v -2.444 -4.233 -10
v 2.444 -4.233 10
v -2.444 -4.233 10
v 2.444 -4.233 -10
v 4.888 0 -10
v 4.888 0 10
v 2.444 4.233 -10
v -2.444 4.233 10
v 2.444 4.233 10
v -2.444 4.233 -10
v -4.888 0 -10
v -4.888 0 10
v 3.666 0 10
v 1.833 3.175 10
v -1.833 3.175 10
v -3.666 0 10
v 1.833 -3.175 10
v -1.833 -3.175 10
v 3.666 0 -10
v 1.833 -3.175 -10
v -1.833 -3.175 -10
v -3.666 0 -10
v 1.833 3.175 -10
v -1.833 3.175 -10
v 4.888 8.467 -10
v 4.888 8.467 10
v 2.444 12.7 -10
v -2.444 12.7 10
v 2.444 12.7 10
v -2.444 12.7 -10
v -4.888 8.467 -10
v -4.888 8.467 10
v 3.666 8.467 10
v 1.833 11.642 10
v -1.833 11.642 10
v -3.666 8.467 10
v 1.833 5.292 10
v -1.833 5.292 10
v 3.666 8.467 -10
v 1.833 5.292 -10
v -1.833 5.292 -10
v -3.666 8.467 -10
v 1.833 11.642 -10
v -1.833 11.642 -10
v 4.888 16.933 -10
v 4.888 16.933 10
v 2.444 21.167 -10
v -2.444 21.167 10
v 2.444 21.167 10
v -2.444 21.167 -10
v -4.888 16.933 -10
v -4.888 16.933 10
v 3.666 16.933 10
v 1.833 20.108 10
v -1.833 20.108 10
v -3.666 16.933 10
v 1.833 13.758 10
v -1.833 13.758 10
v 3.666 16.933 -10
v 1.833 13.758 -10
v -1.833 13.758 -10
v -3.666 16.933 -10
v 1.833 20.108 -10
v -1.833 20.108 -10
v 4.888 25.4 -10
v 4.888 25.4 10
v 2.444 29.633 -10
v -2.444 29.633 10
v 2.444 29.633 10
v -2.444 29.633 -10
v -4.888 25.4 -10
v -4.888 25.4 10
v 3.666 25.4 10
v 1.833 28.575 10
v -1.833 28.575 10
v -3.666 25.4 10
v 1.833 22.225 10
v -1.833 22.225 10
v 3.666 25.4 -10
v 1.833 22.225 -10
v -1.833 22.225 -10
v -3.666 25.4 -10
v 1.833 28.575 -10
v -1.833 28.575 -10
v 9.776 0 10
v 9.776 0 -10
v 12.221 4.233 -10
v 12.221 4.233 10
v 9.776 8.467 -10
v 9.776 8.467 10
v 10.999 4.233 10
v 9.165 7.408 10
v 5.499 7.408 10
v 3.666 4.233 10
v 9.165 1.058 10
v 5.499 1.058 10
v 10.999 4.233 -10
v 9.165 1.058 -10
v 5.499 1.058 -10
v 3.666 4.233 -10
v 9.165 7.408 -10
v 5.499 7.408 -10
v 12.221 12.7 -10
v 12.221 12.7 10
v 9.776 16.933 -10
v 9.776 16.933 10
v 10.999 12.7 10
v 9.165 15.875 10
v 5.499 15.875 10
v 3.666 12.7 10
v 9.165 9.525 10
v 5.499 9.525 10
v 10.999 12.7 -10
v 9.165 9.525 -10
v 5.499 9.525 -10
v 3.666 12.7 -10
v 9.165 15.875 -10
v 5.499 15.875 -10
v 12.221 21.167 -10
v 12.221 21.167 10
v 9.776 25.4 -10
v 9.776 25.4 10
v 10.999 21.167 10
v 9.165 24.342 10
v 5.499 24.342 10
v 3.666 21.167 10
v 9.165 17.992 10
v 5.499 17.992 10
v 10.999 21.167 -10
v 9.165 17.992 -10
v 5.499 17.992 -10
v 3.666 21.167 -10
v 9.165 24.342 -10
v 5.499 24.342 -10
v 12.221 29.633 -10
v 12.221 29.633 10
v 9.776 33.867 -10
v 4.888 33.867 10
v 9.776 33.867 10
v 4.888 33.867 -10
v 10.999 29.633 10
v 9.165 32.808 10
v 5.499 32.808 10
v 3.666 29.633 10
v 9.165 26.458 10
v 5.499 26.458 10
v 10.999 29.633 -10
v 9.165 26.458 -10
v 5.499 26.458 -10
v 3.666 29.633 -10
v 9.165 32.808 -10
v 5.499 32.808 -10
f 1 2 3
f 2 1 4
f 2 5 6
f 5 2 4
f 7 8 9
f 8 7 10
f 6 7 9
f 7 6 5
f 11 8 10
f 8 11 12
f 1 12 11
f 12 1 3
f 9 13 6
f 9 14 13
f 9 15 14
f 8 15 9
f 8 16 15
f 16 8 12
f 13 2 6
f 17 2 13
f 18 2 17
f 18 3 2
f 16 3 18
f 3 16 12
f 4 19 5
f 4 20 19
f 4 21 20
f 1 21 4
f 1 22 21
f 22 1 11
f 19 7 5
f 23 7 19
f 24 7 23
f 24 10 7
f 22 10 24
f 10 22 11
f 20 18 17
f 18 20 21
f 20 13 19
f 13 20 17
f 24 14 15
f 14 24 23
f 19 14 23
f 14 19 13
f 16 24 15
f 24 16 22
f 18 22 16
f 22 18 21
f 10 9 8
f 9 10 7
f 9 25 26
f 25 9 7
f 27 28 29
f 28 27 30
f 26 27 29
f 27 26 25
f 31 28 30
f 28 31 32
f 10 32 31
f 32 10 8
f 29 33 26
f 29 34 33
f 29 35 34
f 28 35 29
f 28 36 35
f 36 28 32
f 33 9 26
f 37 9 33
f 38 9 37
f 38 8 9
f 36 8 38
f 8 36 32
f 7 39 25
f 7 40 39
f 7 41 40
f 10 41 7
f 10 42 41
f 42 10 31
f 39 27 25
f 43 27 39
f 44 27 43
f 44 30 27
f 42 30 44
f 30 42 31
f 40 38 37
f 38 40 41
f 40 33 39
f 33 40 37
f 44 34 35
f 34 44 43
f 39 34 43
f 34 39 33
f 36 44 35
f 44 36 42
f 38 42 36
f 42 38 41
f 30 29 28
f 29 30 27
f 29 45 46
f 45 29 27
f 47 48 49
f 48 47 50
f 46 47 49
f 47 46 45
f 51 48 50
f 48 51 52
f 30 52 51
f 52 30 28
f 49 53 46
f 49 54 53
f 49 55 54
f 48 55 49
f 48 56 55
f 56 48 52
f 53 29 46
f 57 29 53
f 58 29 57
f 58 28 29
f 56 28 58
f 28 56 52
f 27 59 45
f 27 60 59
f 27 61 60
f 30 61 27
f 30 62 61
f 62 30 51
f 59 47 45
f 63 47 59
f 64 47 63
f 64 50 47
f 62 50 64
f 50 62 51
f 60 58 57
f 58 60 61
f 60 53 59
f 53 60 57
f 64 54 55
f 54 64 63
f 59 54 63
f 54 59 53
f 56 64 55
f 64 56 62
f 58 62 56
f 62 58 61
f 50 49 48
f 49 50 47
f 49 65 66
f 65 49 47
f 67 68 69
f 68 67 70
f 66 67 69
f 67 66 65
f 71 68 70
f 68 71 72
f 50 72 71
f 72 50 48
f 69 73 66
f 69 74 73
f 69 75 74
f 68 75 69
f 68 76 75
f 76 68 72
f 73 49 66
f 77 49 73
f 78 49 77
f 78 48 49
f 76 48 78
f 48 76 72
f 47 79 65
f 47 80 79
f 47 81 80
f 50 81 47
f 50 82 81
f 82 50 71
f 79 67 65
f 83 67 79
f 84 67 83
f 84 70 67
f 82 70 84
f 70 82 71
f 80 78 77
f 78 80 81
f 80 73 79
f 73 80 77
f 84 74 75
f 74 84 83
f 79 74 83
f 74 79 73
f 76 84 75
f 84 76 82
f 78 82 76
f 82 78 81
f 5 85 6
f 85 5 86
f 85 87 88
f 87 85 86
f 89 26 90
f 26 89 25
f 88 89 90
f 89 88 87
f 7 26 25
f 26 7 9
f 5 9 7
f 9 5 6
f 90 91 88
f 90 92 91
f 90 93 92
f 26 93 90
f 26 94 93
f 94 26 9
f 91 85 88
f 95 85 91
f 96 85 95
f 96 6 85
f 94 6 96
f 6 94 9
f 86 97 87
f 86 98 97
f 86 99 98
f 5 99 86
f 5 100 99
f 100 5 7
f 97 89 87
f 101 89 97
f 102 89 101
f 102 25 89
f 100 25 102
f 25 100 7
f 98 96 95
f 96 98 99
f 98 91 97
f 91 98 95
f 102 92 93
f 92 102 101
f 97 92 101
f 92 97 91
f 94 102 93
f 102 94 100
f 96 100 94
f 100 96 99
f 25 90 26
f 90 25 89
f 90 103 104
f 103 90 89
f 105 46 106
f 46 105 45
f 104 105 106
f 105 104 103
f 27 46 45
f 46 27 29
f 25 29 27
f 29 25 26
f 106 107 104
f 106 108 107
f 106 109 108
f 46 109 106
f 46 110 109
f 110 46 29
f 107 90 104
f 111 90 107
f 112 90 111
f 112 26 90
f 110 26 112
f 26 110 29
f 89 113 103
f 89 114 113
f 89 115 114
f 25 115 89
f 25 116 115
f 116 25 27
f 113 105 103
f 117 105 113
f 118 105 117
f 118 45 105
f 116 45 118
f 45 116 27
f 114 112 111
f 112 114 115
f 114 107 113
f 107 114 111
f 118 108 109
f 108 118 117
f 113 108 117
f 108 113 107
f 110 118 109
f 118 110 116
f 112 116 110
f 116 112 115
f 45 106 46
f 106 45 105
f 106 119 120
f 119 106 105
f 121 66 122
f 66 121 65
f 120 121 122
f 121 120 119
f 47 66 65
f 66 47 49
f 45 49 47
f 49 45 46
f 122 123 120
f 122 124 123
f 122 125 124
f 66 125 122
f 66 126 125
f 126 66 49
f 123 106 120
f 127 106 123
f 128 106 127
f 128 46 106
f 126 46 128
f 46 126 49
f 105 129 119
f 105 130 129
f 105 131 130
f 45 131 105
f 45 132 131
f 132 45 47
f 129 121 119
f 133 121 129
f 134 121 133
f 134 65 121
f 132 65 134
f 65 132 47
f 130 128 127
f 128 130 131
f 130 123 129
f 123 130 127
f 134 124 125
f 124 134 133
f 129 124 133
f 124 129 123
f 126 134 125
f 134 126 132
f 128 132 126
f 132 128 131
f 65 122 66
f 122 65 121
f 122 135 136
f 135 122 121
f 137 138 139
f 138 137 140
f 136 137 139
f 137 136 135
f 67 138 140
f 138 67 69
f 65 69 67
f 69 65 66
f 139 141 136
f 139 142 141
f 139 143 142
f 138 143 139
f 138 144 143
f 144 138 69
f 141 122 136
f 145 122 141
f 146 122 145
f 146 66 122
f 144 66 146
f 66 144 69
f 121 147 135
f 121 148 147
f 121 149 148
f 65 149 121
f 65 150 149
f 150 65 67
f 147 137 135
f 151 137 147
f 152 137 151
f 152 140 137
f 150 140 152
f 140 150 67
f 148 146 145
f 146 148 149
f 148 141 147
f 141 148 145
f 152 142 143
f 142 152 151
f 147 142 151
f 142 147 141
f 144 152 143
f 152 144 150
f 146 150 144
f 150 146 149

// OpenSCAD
//TODO: Implement / add support for tolerances

//How many bits in a row?
bits_per_row = 4;//[1:10]

//How many rows?
rows = 2;//[1,2]

//What is the diameter of your bit (in mm)?
bit_diameter = 6.35;//[6.35:6.35mm,7.938:7.938mm,11.11:11.11mm]

//in mm
holder_height = 20;//[5:20]

//Margin thickness (ratio of bit diameter)
ratio = 3;//[1.0:5.0]


diameter = bit_diameter;
height = holder_height;
thickness = diameter / ratio;
width = diameter + thickness;


// We use the bottom-up approach.

// Creates a hexagonal cylinder
module hexagon(size, height)
	{
	width = size/sqrt(3);
	cylinder(height, r=width, center=true, $fn=6);
	// alternatives for the generation of hex-cylinders
	//linear_extrude(height) circle(width, $fn=6);
	//for (r = [-60, 0, 60]) rotate([0,0,r]) cube([width, size, height], true);
	}

// Creates a "cell", i.e. a hollowed-out hexagonal cylinder
module cell(diameter, thickness, height)
	{
	difference()
		{
		hexagon(diameter + thickness, height);
		hexagon(diameter, height + 1);
		}
	}

// Creates multiple stringed together cells 
module row(width, count)
	{
	for(i = [0:count-1]) translate([0,i*width,0]) cell(diameter, thickness, height);
	}

// Creates (correctly-positions, same-length) rows of cells
module rows(width, count, rows)
	{
	for(i = [0:rows-1]) translate([i*(1.5*width/sqrt(3)), i*width/2,0]) row(width, count);
	}

// Create the whole shebang
rows(width, bits_per_row, rows);
